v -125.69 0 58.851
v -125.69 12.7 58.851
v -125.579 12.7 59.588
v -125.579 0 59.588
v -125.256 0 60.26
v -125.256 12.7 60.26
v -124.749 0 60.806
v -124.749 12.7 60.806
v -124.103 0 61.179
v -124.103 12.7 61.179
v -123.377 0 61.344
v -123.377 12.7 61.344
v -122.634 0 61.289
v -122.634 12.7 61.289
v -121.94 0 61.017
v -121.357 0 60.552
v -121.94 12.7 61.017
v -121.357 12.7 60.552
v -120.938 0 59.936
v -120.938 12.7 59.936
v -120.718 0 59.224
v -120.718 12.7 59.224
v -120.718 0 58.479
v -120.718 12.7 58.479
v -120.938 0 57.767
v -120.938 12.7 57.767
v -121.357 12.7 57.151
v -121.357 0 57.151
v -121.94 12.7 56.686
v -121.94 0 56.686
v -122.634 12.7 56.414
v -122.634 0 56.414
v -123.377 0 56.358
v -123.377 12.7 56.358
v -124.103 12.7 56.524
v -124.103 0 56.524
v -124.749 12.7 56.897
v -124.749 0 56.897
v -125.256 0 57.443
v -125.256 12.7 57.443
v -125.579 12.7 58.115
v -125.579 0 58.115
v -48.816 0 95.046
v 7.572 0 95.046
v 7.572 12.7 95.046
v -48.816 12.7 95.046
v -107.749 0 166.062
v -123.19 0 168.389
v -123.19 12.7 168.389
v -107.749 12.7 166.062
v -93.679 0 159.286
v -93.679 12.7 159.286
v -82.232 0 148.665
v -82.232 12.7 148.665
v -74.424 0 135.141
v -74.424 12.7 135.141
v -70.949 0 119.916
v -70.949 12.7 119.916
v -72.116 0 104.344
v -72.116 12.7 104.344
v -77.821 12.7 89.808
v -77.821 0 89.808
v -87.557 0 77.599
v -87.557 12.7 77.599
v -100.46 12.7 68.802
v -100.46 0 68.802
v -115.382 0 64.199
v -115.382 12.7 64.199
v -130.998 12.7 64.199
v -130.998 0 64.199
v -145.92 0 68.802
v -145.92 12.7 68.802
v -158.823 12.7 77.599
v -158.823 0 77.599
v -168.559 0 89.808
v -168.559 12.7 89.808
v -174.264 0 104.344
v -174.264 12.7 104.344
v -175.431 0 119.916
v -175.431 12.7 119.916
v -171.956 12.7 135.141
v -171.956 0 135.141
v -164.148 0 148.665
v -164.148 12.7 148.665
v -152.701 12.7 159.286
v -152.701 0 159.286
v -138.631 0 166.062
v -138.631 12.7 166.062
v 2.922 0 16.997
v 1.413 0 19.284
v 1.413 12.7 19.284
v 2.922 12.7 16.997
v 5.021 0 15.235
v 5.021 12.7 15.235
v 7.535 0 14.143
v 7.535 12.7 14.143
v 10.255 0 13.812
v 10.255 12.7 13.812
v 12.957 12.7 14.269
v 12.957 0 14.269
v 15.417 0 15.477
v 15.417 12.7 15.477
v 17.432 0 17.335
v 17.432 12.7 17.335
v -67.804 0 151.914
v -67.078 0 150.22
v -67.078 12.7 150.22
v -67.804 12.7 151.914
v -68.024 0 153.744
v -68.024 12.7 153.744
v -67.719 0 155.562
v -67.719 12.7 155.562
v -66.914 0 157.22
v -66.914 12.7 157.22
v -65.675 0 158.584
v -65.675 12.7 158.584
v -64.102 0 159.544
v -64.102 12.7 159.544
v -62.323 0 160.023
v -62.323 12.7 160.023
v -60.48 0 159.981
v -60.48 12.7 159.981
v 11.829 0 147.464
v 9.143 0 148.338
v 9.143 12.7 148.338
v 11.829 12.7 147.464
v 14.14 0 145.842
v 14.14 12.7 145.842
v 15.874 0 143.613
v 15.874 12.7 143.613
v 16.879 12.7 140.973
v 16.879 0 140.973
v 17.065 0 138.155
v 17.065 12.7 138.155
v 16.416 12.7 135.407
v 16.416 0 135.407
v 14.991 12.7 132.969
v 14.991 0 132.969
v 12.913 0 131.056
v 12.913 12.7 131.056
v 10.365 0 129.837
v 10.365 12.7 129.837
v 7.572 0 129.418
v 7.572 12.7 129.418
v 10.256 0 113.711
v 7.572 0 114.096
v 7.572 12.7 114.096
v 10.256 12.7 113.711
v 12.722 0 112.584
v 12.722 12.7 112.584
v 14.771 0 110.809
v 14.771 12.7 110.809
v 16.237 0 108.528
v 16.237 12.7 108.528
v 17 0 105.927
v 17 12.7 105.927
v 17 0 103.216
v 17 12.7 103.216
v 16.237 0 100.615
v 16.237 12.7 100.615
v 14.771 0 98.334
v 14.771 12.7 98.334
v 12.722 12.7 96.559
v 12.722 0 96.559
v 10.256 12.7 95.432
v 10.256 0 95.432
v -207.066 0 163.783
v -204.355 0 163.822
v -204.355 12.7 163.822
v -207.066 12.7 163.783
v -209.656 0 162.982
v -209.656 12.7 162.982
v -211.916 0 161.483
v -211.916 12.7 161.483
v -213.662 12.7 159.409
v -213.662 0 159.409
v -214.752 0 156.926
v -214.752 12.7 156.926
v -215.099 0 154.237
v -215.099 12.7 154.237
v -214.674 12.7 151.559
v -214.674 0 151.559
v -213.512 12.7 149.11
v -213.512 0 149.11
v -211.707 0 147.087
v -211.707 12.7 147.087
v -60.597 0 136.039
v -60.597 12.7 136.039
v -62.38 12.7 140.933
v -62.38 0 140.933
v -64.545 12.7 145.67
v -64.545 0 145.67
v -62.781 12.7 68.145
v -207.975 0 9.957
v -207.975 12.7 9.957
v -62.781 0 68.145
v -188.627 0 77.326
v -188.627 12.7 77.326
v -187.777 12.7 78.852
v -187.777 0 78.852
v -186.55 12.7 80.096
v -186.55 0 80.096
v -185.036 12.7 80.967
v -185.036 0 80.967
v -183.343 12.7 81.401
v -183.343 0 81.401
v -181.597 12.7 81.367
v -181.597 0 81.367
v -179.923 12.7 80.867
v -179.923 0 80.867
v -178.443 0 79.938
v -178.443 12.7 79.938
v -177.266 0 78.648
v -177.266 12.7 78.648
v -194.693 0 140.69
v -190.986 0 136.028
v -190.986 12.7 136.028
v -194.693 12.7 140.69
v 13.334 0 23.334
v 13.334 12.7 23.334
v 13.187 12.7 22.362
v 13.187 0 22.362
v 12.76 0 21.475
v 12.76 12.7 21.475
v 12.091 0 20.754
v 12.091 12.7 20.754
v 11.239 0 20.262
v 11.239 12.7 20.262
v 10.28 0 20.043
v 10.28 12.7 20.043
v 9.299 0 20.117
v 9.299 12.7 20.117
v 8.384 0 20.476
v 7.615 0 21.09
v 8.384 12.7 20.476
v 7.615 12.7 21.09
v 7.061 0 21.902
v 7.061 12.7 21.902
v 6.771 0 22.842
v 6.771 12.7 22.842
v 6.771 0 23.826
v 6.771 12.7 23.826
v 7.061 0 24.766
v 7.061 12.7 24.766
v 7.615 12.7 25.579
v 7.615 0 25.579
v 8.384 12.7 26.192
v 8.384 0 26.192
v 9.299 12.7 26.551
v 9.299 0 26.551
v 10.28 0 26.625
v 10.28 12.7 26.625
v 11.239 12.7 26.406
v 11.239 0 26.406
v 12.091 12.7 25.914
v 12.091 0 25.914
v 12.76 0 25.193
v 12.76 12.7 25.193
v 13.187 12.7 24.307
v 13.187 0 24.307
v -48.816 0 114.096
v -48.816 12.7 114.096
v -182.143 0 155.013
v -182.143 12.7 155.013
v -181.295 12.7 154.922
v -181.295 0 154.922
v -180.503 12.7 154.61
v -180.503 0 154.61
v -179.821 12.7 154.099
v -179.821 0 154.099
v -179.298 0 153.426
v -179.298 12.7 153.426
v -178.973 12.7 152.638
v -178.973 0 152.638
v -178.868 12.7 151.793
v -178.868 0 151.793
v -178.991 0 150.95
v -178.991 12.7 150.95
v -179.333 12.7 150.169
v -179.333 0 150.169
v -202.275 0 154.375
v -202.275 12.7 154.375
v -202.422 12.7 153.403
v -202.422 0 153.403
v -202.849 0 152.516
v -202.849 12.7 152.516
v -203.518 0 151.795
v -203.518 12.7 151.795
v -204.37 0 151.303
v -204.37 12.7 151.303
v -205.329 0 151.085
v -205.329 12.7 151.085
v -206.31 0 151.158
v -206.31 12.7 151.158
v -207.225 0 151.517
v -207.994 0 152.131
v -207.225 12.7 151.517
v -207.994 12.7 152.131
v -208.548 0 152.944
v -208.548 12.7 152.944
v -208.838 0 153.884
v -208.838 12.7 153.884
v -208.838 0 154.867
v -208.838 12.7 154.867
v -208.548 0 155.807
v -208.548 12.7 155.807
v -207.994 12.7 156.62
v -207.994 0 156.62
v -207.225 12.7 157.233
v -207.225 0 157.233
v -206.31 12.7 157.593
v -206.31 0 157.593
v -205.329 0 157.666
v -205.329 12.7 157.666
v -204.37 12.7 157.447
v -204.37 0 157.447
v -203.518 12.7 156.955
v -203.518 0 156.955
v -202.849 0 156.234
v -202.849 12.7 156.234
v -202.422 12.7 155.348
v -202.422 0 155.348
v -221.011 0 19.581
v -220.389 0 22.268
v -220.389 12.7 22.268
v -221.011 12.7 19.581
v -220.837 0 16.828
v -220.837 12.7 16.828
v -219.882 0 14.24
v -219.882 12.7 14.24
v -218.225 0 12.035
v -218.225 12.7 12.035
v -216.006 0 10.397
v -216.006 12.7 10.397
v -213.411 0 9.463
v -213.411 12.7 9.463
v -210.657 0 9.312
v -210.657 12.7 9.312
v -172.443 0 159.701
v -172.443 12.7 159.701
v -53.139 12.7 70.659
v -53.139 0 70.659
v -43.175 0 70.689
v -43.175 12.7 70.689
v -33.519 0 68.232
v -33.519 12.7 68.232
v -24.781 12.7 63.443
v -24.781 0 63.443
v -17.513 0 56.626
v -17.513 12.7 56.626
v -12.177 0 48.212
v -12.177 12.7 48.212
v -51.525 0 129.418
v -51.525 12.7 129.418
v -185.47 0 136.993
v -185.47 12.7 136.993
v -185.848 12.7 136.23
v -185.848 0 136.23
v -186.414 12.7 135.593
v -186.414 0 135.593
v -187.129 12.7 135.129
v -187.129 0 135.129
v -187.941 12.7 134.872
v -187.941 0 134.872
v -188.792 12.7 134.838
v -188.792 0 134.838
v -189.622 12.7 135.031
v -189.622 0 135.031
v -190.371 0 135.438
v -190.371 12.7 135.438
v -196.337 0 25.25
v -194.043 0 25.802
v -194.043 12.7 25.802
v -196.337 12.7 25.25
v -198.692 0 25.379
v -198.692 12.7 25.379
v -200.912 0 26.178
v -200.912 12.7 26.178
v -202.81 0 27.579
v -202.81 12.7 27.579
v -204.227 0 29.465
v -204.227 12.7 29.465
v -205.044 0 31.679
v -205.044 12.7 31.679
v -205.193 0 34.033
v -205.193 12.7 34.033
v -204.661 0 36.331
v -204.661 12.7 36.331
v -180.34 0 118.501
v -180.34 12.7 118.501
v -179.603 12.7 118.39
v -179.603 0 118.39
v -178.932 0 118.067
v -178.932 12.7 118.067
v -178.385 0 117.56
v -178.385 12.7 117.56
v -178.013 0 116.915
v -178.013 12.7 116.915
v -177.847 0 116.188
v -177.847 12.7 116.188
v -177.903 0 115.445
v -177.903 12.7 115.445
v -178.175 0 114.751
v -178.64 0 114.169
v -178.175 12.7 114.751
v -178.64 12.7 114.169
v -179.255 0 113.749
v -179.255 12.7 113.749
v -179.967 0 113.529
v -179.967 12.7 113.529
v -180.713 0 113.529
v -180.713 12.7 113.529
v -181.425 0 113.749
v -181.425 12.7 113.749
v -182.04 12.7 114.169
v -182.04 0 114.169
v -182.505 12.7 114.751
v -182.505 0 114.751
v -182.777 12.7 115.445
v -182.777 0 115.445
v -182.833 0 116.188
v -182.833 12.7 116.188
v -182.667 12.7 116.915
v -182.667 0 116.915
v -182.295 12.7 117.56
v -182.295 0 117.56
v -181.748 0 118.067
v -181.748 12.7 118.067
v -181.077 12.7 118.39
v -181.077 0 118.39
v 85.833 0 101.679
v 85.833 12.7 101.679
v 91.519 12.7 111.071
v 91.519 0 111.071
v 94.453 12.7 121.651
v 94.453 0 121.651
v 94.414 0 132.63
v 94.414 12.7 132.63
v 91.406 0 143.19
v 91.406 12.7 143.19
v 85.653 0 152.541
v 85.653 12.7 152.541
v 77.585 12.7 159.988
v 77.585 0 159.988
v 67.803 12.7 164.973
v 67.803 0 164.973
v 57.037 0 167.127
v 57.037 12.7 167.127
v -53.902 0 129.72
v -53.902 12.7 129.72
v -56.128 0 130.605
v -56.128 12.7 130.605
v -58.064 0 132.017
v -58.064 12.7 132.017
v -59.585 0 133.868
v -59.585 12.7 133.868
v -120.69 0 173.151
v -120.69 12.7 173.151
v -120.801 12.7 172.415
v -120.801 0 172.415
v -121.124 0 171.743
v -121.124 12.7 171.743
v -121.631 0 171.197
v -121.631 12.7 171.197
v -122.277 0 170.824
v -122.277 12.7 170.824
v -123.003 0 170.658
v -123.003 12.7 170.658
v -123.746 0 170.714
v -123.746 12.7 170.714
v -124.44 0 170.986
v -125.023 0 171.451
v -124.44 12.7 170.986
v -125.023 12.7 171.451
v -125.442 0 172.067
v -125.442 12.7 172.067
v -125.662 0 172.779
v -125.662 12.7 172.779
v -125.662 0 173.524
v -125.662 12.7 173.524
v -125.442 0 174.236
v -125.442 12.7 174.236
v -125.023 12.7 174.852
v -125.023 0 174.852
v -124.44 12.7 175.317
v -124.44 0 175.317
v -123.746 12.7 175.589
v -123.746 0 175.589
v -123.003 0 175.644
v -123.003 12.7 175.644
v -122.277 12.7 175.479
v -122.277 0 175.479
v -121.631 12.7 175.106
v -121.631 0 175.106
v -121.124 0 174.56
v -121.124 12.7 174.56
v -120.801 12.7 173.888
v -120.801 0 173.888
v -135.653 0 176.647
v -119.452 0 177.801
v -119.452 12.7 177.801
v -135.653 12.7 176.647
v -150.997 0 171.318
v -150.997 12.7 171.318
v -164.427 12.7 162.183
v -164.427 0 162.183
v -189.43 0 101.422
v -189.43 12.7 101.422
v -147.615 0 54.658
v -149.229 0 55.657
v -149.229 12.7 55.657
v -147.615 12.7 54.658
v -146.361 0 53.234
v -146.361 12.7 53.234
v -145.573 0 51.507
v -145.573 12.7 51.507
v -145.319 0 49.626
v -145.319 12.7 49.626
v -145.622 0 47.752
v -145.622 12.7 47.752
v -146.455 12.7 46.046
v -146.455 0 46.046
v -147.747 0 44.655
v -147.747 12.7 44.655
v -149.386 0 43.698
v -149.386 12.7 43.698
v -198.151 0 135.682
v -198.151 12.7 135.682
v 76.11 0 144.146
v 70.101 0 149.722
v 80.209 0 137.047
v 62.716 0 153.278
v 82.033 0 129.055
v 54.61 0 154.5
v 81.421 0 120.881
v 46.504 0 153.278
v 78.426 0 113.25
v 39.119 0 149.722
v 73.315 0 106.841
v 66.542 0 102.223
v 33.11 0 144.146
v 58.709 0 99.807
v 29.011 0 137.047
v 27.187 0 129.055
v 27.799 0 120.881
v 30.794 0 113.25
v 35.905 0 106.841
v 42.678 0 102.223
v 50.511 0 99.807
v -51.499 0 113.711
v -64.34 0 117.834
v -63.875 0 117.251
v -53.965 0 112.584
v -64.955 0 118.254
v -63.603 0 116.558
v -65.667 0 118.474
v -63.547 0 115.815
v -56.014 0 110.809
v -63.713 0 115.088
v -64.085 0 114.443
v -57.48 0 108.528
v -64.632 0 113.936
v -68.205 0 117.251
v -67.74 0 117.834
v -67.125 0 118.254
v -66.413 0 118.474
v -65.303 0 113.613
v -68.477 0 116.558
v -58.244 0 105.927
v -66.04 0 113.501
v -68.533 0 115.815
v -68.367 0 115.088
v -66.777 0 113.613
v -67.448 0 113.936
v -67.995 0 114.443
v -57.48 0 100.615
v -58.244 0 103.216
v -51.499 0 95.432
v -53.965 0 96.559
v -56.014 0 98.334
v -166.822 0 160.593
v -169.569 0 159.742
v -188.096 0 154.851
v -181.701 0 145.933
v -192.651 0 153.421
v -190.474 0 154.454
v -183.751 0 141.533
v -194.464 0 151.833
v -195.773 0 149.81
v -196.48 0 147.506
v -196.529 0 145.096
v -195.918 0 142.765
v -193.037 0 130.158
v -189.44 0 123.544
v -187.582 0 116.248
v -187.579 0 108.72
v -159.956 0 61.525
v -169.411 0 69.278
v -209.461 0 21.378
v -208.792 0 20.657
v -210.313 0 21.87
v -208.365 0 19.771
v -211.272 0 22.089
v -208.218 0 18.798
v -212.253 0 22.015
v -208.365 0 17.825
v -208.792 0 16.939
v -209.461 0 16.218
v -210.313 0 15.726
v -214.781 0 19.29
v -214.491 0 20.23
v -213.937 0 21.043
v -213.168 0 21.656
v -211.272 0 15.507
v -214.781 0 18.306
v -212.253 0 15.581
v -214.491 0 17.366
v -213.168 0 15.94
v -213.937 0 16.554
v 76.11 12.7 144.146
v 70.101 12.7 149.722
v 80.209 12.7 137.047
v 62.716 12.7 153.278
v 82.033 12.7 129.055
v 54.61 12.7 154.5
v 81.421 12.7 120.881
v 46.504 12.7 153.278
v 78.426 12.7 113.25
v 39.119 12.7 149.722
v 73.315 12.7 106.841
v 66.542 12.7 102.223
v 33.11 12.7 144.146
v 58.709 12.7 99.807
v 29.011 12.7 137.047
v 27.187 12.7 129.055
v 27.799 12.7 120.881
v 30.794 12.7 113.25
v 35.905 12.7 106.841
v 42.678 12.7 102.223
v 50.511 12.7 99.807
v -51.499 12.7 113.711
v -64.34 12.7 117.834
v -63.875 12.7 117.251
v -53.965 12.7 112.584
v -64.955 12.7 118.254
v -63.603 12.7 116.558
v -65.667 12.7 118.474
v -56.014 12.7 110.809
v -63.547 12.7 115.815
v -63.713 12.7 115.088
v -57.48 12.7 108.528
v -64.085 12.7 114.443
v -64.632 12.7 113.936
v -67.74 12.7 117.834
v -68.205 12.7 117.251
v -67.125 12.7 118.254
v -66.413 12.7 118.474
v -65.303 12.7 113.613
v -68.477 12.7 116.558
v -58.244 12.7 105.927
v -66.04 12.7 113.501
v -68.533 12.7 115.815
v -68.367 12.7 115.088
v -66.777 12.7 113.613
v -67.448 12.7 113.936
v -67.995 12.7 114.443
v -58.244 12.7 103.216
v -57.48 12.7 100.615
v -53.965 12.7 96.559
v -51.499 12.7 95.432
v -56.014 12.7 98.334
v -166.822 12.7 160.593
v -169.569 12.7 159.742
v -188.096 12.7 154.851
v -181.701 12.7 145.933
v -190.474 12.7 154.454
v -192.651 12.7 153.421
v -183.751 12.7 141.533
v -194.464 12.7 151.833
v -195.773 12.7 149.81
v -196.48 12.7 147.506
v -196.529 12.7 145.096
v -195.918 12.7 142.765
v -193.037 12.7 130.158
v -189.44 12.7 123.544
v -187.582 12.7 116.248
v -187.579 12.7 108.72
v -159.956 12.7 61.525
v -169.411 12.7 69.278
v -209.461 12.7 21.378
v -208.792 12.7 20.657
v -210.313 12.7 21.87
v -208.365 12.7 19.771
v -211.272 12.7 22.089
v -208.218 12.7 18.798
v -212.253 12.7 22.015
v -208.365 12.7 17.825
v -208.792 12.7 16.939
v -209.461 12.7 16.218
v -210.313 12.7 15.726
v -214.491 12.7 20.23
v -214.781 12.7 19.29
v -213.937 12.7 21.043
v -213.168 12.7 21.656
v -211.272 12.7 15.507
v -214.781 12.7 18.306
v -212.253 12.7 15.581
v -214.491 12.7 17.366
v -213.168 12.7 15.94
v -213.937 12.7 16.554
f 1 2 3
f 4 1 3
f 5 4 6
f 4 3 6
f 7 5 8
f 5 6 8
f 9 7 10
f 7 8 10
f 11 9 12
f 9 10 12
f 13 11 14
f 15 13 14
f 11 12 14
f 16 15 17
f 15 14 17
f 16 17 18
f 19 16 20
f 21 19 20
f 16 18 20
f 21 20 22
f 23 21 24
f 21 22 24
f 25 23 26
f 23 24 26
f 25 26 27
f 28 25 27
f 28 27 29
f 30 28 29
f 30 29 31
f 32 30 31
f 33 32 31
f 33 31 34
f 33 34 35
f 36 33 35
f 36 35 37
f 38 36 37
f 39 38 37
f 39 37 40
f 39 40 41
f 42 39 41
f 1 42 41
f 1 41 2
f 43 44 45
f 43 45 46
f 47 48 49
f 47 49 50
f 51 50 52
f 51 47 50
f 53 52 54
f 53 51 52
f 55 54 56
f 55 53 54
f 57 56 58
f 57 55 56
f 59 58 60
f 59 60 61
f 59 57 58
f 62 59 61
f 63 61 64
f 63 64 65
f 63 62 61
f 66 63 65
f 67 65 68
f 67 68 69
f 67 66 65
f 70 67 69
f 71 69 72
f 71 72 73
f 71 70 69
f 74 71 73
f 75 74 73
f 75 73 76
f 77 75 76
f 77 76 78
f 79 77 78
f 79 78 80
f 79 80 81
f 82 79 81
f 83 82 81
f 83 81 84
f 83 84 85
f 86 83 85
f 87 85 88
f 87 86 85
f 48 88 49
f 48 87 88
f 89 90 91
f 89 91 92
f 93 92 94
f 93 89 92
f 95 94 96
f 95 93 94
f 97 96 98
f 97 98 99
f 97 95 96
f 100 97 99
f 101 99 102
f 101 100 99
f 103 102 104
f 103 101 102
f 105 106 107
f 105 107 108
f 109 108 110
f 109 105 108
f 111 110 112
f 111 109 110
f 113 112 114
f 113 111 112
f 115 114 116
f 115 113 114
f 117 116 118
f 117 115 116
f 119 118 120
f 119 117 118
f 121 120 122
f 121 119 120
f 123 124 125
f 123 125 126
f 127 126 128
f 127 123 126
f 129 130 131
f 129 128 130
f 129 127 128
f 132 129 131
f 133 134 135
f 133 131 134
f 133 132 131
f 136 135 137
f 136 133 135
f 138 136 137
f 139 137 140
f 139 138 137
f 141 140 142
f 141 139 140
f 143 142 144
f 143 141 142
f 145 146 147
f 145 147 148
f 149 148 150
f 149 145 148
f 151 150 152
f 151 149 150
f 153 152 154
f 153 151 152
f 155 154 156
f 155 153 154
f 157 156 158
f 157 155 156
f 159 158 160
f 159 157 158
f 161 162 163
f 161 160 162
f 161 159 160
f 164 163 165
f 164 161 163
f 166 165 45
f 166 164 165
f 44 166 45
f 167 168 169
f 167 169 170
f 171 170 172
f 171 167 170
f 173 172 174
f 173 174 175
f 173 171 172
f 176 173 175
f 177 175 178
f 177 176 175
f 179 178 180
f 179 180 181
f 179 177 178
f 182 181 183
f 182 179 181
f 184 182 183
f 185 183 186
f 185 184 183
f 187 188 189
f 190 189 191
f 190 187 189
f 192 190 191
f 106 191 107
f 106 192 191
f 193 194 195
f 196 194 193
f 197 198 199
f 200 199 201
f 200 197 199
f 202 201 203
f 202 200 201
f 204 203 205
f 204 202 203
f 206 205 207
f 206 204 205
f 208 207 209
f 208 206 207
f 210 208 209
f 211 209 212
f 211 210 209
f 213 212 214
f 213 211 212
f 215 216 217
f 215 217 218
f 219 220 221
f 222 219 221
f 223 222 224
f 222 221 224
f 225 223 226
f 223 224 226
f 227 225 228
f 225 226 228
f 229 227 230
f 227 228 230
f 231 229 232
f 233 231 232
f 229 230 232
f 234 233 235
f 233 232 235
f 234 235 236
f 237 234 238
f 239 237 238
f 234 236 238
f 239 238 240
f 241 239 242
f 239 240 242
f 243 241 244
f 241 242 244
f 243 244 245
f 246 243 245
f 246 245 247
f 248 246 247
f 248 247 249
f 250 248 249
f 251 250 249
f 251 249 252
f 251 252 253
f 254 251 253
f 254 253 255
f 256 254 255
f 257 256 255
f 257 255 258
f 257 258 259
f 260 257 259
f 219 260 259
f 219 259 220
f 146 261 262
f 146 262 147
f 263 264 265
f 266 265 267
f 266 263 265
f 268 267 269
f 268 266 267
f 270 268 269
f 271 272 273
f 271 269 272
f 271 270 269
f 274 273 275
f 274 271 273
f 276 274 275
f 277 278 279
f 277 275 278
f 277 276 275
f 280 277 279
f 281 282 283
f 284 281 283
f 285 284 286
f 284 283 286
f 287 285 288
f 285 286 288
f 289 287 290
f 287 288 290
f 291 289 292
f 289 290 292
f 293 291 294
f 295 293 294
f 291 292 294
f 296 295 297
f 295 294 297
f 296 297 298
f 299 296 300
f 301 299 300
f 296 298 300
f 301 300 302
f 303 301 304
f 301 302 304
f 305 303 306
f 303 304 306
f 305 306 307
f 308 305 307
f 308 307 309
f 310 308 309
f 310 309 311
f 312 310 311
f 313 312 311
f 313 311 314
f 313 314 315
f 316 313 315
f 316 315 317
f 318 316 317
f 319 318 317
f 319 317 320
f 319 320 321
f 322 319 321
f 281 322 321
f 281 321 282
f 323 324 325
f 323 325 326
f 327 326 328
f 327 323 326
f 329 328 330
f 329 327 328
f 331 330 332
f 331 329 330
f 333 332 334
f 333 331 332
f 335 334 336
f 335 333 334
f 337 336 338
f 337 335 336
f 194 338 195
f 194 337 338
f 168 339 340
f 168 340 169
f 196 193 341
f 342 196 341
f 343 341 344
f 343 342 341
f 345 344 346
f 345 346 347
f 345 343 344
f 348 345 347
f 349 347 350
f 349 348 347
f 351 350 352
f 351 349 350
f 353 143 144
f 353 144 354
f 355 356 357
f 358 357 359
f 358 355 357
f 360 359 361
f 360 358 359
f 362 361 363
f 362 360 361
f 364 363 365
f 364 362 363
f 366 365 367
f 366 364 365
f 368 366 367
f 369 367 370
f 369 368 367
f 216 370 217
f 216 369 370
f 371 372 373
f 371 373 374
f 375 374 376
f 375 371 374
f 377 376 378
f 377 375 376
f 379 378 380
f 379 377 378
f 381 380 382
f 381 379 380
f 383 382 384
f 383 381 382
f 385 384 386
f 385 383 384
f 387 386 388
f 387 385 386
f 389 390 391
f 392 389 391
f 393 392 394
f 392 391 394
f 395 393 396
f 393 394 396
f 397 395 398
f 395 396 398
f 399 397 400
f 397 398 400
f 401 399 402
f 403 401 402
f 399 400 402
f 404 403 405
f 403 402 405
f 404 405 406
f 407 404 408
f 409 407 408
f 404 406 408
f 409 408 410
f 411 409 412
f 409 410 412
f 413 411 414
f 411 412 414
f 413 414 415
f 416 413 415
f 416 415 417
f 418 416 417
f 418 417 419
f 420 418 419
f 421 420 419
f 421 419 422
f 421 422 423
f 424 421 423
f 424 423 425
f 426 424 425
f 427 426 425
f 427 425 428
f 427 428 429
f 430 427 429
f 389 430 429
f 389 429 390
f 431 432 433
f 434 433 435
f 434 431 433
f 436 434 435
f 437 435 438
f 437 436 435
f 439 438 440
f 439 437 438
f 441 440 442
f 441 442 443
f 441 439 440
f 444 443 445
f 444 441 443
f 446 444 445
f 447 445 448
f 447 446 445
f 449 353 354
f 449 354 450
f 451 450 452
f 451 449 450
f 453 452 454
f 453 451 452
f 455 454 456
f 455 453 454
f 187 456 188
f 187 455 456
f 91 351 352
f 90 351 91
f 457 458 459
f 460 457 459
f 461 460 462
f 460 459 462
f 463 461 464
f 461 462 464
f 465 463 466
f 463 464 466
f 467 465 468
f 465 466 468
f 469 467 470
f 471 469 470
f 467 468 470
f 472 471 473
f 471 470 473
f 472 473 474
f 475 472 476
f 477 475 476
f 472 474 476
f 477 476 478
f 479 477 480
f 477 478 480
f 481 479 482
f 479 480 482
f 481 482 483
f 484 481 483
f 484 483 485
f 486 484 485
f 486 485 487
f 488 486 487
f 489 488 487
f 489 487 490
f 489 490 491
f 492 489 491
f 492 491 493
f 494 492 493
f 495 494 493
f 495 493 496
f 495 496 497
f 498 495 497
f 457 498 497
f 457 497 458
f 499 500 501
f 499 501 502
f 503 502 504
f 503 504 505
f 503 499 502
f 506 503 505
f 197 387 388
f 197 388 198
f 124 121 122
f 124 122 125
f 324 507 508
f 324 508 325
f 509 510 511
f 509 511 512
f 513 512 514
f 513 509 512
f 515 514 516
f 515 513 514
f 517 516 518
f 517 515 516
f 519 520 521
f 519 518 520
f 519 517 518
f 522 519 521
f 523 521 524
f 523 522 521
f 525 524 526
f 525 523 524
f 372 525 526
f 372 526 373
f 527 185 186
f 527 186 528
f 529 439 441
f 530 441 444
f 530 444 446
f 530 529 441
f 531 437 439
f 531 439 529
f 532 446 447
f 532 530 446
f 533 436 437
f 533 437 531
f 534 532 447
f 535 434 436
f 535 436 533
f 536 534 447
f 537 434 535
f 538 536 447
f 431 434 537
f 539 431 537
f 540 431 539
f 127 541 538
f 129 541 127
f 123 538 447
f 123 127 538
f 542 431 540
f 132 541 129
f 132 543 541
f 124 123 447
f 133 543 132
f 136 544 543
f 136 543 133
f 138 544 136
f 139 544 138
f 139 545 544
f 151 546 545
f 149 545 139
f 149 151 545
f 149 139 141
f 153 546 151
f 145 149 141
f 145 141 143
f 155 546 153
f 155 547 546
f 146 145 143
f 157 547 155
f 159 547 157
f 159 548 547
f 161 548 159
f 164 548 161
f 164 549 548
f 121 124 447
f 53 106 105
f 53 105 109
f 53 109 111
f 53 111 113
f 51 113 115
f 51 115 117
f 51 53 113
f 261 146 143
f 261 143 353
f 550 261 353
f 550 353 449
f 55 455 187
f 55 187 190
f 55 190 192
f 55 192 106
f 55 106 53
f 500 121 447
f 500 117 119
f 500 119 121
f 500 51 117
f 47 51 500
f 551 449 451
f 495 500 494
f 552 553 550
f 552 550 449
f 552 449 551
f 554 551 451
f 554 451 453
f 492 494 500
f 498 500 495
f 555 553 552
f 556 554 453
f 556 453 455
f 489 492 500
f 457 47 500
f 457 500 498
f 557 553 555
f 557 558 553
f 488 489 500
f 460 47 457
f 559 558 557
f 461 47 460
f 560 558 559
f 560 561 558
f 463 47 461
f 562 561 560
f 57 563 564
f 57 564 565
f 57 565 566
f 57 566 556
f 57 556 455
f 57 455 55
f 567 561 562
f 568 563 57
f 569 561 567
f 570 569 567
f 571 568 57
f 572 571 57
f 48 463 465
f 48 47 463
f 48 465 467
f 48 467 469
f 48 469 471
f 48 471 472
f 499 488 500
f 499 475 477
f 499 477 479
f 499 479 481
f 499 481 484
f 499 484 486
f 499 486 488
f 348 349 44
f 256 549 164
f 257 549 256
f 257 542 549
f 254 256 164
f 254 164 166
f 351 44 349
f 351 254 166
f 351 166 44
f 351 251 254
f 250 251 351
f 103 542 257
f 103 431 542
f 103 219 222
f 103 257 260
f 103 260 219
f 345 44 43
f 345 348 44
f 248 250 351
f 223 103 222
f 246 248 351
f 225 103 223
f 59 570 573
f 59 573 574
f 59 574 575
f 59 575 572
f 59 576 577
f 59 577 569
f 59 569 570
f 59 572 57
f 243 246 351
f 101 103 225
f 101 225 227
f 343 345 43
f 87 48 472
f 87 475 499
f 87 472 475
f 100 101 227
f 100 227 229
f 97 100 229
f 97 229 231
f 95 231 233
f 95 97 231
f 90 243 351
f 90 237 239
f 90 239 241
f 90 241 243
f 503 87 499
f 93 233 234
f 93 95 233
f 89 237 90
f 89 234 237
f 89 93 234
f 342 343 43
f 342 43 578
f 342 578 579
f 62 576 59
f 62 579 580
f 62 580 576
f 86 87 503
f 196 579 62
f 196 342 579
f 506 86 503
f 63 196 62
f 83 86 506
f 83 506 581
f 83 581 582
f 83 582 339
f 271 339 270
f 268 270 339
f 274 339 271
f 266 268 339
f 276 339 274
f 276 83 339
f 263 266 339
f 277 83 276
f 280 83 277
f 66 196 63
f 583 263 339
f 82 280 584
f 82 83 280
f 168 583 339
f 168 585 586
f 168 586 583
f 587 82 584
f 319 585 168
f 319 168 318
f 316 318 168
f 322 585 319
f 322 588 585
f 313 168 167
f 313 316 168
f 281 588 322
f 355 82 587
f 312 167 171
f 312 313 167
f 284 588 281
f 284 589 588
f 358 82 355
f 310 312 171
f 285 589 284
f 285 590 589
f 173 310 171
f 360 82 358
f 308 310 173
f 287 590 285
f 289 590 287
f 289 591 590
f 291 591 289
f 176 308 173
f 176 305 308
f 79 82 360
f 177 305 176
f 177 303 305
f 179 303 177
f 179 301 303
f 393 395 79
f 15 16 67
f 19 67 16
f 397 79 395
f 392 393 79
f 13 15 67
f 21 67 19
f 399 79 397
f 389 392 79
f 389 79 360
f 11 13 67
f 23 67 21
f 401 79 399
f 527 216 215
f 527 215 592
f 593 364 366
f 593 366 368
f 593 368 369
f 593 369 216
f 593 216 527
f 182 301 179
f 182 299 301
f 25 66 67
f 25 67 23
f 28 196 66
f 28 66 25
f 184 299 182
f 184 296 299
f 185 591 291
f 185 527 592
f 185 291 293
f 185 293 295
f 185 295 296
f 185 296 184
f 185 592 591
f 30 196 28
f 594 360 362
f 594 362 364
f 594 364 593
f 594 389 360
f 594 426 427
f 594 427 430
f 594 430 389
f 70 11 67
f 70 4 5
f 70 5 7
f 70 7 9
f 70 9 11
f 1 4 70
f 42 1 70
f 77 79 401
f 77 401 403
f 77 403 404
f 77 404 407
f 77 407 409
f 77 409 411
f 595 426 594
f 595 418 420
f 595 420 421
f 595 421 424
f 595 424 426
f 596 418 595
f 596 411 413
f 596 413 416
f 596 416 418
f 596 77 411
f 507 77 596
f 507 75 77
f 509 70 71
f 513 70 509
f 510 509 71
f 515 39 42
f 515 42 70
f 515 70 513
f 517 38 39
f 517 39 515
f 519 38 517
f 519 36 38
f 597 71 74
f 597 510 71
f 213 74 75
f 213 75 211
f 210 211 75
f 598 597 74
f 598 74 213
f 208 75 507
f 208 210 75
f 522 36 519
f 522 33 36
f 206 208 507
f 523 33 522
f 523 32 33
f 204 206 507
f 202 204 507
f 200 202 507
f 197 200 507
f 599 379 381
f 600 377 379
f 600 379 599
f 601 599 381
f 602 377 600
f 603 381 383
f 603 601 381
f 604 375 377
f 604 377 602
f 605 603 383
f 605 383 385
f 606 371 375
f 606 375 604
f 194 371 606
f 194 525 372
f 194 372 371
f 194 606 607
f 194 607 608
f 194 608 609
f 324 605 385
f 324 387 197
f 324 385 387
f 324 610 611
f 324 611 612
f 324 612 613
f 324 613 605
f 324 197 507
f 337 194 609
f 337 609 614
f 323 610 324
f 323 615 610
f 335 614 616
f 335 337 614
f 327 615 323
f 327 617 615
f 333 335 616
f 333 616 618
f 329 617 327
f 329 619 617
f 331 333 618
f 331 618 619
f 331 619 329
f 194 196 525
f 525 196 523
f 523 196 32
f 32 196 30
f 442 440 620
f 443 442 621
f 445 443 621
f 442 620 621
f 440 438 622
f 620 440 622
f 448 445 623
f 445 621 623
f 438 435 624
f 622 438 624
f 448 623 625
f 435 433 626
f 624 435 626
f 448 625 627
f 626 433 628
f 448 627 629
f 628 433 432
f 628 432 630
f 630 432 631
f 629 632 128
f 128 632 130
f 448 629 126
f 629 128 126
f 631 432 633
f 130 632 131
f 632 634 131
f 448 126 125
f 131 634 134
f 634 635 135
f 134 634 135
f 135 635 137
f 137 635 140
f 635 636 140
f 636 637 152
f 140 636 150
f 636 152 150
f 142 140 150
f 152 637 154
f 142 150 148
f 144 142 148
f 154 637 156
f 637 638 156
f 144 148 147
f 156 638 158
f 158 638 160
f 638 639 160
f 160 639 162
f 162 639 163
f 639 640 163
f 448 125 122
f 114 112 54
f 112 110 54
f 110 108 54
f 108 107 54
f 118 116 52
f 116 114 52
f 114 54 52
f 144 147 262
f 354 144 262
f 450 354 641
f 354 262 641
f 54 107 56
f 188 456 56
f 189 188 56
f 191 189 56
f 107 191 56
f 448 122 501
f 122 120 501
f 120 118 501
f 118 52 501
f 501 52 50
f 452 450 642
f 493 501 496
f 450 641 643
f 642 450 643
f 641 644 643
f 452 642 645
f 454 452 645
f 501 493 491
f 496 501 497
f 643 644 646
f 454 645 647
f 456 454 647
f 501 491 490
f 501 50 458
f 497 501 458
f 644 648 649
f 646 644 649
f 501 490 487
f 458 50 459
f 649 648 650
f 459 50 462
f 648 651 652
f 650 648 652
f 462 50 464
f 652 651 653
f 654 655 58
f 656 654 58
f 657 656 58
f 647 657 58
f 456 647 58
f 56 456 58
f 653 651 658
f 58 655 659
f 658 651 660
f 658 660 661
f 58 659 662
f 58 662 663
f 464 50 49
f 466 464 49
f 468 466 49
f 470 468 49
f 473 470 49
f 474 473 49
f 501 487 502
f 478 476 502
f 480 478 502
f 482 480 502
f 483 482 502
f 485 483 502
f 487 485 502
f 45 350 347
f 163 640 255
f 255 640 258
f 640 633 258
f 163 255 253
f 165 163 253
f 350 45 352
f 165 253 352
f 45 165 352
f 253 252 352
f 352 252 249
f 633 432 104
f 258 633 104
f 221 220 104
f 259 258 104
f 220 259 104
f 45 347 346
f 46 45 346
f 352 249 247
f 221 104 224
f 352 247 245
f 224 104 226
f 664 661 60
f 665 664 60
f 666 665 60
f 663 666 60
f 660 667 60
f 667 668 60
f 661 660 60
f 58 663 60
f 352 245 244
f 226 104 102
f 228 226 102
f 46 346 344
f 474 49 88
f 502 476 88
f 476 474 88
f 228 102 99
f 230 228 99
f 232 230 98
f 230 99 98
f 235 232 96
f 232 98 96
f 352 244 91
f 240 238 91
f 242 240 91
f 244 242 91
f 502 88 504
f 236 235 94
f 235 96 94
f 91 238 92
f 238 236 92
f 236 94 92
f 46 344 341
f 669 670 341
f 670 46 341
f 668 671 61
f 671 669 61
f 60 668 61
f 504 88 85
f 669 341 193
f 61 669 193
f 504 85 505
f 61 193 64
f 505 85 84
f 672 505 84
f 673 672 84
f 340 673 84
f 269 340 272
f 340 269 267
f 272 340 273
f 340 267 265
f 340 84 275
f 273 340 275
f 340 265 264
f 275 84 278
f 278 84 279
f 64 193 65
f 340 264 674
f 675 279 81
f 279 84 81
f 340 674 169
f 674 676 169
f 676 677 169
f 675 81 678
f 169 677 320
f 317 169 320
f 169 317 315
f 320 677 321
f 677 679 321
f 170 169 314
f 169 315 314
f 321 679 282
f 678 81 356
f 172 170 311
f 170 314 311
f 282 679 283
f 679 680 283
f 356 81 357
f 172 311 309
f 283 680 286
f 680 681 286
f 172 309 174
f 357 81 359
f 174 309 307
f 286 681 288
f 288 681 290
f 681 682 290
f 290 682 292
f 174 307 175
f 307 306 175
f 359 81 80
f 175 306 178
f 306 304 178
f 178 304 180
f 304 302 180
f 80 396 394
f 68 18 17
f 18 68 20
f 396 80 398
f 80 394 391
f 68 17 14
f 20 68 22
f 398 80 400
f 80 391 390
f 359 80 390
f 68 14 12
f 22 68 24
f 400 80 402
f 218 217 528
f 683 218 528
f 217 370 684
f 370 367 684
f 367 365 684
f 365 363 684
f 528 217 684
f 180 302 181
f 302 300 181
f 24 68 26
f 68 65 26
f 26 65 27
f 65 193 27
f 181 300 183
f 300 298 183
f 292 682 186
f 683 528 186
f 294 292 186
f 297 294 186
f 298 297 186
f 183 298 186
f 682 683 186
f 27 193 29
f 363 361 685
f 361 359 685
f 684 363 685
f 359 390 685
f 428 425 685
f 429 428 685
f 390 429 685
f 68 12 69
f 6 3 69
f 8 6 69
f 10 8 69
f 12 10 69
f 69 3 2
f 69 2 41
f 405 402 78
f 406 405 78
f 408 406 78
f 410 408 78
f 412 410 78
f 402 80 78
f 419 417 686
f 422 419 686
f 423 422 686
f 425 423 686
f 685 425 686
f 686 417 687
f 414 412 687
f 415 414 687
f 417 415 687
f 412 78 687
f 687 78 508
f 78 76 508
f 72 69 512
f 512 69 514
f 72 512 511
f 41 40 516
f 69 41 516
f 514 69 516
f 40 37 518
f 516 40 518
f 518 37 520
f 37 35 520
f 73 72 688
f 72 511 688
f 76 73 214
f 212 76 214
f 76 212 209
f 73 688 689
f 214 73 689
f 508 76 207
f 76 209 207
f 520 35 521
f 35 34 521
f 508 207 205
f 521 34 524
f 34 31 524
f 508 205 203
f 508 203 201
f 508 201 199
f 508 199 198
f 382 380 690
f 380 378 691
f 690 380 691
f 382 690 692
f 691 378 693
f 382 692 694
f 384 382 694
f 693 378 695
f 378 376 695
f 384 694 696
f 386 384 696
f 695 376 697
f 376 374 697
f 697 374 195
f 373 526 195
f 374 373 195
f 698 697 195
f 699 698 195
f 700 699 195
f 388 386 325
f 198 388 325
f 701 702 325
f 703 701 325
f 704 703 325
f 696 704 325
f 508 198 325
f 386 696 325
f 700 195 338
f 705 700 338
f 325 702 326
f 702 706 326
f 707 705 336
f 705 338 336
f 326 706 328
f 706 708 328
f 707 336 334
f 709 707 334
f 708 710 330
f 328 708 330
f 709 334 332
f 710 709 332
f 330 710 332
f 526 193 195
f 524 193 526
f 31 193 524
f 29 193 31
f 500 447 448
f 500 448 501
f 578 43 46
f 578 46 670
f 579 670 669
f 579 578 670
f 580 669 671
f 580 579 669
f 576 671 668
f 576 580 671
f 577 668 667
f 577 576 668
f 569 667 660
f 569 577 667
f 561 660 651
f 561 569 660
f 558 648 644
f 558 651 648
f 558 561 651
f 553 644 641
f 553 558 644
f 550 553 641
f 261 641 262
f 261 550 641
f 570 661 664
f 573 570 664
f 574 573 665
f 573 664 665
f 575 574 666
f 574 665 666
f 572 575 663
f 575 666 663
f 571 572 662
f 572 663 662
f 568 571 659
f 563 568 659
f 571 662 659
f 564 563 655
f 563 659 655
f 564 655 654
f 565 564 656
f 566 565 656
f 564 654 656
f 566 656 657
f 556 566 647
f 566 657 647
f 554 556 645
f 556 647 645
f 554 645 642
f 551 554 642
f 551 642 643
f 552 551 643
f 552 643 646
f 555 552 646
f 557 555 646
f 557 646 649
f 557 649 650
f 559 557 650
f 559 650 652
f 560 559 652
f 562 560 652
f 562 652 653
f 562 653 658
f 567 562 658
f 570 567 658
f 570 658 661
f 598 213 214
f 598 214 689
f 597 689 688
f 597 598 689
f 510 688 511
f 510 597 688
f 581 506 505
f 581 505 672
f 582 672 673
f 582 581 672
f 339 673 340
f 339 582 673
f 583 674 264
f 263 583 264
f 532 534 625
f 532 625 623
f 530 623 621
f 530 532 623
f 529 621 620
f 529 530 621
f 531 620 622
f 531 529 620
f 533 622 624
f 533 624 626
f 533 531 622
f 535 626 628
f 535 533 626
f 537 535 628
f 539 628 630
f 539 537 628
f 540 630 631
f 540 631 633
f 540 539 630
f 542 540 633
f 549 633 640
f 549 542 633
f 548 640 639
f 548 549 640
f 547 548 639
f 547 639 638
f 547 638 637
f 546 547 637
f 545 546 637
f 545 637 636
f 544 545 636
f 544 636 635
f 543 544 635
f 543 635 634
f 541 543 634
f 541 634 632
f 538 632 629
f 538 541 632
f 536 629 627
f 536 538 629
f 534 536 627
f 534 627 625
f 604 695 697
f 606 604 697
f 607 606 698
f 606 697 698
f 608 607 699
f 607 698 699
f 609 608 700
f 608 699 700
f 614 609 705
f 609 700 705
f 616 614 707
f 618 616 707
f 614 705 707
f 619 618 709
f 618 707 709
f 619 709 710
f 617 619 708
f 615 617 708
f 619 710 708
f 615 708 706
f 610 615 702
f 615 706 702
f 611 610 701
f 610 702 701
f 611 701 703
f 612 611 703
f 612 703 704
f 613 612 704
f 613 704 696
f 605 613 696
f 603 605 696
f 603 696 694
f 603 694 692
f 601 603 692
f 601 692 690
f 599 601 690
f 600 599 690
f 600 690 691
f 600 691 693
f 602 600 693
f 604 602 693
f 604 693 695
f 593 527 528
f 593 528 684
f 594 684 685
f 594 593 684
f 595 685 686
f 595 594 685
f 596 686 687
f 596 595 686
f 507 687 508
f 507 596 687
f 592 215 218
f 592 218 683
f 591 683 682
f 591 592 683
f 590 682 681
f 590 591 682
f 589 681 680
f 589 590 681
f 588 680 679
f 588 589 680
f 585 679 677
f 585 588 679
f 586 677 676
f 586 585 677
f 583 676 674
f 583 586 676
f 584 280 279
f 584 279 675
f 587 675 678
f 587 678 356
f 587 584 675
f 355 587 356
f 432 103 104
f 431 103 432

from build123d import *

# Parameters (mm, degrees)
SKETCH1_R             = 52.3875
SKETCH1_R_2           = 27.49999999
BOSS_EXTRUDE1_DEPTH   = 12.7
M6_CLEARANCE_HOLE1_D  = 6.6
F_5_0MM_DOWEL_HOLE1_D = 5
CIRPATTERN1_COUNT     = 4
CUT_EXTRUDE1_DEPTH    = 285.033029848
CUT_EXTRUDE2_DEPTH    = 285.033029848


with BuildPart() as part:
    # Sketch1 → Boss-Extrude1 (new body)
    with BuildSketch(Plane(origin=(0, 0, 0), x_dir=(1, 0, 0), z_dir=(0, 1, 0))):
        with BuildLine():
            Line((-207.974881785, -9.956762437), (-62.780706514, -68.14502812))
            ThreePointArc((-62.780706514, -68.14502812), (-33.518744337, -68.231765471), (-12.176603989, -48.212200061))
            Line((-12.176603989, -48.212200061), (1.412558245, -19.284326264))
            ThreePointArc((1.412558245, -19.284326264), (8.882880061, -13.878975143), (17.431697461, -17.334586496))
            Line((17.431697461, -17.334586496), (85.833023855, -101.678807679))
            ThreePointArc((85.833023855, -101.678807679), (91.405865058, -143.189636001), (57.036931176, -167.126674473))
            Line((57.036931176, -167.126674473), (-119.452254317, -177.801047868))
            ThreePointArc((-119.452254317, -177.801047868), (-143.500663307, -174.487669009), (-164.426538493, -162.182702446))
            ThreePointArc((-164.426538493, -162.182702446), (-168.164823601, -160.06920649), (-172.443362527, -159.700770109))
            Line((-172.443362527, -159.700770109), (-204.355245166, -163.82191268))
            ThreePointArc((-204.355245166, -163.82191268), (-214.295764489, -158.206433226), (-211.707233022, -147.086764223))
            Line((-211.707233022, -147.086764223), (-198.151371623, -135.681934472))
            ThreePointArc((-198.151371623, -135.681934472), (-188.283833694, -119.954004575), (-189.430137427, -101.422354045))
            Line((-189.430137427, -101.422354045), (-220.388836369, -22.267635732))
            ThreePointArc((-220.388836369, -22.267635732), (-218.225236723, -12.034965467), (-207.974881785, -9.956762437))
        make_face()
        with Locations(Location((-123.19, -116.001477372, 0), (0, 0, 270))):
            Circle(SKETCH1_R, mode=Mode.SUBTRACT)
        with Locations(Location((54.61, -127, 0), (0, 0, 270))):
            Circle(SKETCH1_R_2, mode=Mode.SUBTRACT)
    extrude(amount=BOSS_EXTRUDE1_DEPTH)

    # M6 Clearance Hole1 (through all)
    with Locations(Plane(origin=(0, 0, 0), x_dir=(-1, 0, 0), z_dir=(0, -1, 0))):
        with Locations((-10.033704867, -23.334197365), (211.518182886, -18.798178744), (205.575185514, -154.375359311)):
            Hole(M6_CLEARANCE_HOLE1_D / 2)

    # Ø5.0mm Dowel Hole1 (through all)
    with Locations(Plane(origin=(0, 0, 0), x_dir=(-1, 0, 0), z_dir=(0, -1, 0))):
        with Locations((123.19, -173.151477372)):
            f_5_0mm_dowel_hole1 = Hole(F_5_0MM_DOWEL_HOLE1_D / 2)

    # CirPattern1: Ø5.0mm Dowel Hole1 ×4 about axis
    cirpattern1_axis = Axis((-123.19, 0, 116.001477372), (0, 1, 0))
    for i in range(1, CIRPATTERN1_COUNT):
        add(f_5_0mm_dowel_hole1.rotate(cirpattern1_axis, i * 360 / CIRPATTERN1_COUNT), mode=Mode.SUBTRACT)

    # Sketch6 → Cut-Extrude1 (cut, through all)
    with BuildSketch(Plane.XZ):
        with BuildLine():
            ThreePointArc((-188.626913597, 77.326218823), (-183.343464985, 81.400582198), (-177.265672517, 78.648182362))
            ThreePointArc((-177.265672517, 78.648182362), (-164.864290964, 65.181201114), (-149.229324423, 55.657458697))
            ThreePointArc((-149.229324423, 55.657458697), (-145.319075006, 49.625624375), (-149.386073966, 43.698348841))
            Line((-149.386073966, 43.698348841), (-194.042740287, 25.801666969))
            ThreePointArc((-194.042740287, 25.801666969), (-202.810079512, 27.579196728), (-204.660650751, 36.331409888))
            Line((-204.660650751, 36.331409888), (-188.626913597, 77.326218823))
        make_face()
        with BuildLine():
            ThreePointArc((-194.692687992, 140.689511725), (-195.773357295, 149.809803058), (-188.096484537, 154.850952212))
            Line((-188.096484537, 154.850952212), (-182.142551509, 155.01295786))
            ThreePointArc((-182.142551509, 155.01295786), (-179.298484939, 153.425933155), (-179.332786017, 150.169219243))
            ThreePointArc((-179.332786017, 150.169219243), (-182.766707481, 143.751485155), (-185.46990532, 136.993390091))
            ThreePointArc((-185.46990532, 136.993390091), (-187.940827525, 134.871620657), (-190.985681304, 136.027573744))
            Line((-190.985681304, 136.027573744), (-194.692687992, 140.689511725))
        make_face()
    extrude(amount=-CUT_EXTRUDE1_DEPTH, mode=Mode.SUBTRACT)

    # Sketch7 → Cut-Extrude2 (cut, through all)
    with BuildSketch(Plane.XZ):
        with BuildLine():
            Line((-48.815667356, 114.096477372), (7.572332644, 114.096477372))
            ThreePointArc((7.572332644, 114.096477372), (17.097332644, 104.571477372), (7.572332644, 95.046477372))
            Line((7.572332644, 95.046477372), (-48.815667356, 95.046477372))
            ThreePointArc((-48.815667356, 95.046477372), (-58.340667356, 104.571477372), (-48.815667356, 114.096477372))
        make_face()
        with BuildLine():
            Line((-60.480063265, 159.980626251), (9.143311078, 148.338049571))
            ThreePointArc((9.143311078, 148.338049571), (17.064665217, 138.155302762), (7.572332644, 129.418495204))
            Line((7.572332644, 129.418495204), (-51.525154545, 129.418495204))
            ThreePointArc((-51.525154545, 129.418495204), (-57.140513894, 131.249772802), (-60.59665397, 136.039442314))
            ThreePointArc((-60.59665397, 136.039442314), (-63.415414116, 143.322639291), (-67.078188304, 150.220062883))
            ThreePointArc((-67.078188304, 150.220062883), (-66.914295931, 157.219714512), (-60.480063265, 159.980626251))
        make_face()
    extrude(amount=-CUT_EXTRUDE2_DEPTH, mode=Mode.SUBTRACT)


solid = part.part
